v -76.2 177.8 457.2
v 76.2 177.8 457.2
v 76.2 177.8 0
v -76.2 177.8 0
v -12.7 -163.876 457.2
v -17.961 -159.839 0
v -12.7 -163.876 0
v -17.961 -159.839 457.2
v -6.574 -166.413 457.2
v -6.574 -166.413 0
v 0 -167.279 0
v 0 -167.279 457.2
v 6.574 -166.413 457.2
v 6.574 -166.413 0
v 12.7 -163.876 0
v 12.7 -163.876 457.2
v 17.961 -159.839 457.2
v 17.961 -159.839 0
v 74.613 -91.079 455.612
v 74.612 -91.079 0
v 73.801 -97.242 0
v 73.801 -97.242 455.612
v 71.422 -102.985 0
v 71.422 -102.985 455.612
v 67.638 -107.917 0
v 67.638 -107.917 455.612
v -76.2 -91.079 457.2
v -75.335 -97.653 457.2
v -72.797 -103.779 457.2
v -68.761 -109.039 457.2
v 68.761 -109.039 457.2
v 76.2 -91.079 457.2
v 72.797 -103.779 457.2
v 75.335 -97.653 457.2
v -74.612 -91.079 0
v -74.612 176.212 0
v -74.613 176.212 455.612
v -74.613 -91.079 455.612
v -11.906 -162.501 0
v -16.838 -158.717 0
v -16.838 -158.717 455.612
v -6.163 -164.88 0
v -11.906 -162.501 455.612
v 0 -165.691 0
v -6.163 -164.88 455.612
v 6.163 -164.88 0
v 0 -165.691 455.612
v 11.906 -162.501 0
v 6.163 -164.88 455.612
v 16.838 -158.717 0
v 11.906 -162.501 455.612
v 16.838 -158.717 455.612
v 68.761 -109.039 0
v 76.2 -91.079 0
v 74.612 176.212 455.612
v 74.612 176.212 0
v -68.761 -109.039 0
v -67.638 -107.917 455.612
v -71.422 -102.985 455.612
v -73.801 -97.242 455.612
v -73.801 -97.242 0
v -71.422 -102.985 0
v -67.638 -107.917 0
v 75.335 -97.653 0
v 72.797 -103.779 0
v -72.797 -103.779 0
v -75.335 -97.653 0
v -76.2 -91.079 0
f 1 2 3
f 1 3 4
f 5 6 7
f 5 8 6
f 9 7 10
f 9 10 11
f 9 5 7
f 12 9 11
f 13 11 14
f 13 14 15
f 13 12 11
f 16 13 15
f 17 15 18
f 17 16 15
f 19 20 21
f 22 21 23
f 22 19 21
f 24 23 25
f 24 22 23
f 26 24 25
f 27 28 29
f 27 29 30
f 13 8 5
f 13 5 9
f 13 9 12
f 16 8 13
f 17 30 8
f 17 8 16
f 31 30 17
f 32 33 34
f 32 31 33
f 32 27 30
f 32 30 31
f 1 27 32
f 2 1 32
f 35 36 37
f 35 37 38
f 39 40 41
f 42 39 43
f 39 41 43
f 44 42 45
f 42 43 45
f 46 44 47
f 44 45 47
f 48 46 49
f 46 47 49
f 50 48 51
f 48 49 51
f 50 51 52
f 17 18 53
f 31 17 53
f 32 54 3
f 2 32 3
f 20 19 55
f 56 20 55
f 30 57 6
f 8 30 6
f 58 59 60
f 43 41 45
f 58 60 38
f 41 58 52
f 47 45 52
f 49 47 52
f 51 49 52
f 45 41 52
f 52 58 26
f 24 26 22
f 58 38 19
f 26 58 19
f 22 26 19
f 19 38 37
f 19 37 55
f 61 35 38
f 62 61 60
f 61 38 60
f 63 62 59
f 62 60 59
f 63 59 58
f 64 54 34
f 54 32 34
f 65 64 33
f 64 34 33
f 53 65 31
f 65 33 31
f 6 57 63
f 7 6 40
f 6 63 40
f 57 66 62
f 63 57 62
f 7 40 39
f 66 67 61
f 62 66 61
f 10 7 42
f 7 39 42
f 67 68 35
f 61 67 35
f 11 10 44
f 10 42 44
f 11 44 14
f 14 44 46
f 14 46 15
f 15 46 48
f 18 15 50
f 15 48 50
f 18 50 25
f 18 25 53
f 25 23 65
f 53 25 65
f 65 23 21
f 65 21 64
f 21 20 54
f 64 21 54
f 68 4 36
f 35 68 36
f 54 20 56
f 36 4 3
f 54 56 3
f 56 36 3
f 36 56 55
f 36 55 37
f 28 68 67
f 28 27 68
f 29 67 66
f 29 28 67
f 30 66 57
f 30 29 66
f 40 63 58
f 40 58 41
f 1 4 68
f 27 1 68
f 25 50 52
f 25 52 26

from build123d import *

# Parameters (mm, degrees)
F1_DEPTH = 457.2
F2_R     = 25.4
F3_T     = -1.5875


with BuildPart() as f1:
    # F0 (on Top) → F1 (new body)
    with BuildSketch(Plane.XY):
        Polygon((76.2, -101.6), (76.2, 177.8), (-76.2, 177.8), (-76.2, -101.6), (0, -177.8), align=None)
    extrude(amount=F1_DEPTH)

    # F2
    f2_edges = [f1.edges().sort_by_distance(p)[0] for p in [
        (0, -177.8, 228.6),
        (76.2, -101.6, 228.6),
        (-76.2, -101.6, 228.6),
    ]]
    fillet(f2_edges, radius=F2_R)

    # F3
    f3_openings = [f1.faces().sort_by_distance(p)[0] for p in [
        (0, 18.896629, 0),
    ]]
    offset(amount=F3_T, openings=f3_openings)


solid = f1.part
